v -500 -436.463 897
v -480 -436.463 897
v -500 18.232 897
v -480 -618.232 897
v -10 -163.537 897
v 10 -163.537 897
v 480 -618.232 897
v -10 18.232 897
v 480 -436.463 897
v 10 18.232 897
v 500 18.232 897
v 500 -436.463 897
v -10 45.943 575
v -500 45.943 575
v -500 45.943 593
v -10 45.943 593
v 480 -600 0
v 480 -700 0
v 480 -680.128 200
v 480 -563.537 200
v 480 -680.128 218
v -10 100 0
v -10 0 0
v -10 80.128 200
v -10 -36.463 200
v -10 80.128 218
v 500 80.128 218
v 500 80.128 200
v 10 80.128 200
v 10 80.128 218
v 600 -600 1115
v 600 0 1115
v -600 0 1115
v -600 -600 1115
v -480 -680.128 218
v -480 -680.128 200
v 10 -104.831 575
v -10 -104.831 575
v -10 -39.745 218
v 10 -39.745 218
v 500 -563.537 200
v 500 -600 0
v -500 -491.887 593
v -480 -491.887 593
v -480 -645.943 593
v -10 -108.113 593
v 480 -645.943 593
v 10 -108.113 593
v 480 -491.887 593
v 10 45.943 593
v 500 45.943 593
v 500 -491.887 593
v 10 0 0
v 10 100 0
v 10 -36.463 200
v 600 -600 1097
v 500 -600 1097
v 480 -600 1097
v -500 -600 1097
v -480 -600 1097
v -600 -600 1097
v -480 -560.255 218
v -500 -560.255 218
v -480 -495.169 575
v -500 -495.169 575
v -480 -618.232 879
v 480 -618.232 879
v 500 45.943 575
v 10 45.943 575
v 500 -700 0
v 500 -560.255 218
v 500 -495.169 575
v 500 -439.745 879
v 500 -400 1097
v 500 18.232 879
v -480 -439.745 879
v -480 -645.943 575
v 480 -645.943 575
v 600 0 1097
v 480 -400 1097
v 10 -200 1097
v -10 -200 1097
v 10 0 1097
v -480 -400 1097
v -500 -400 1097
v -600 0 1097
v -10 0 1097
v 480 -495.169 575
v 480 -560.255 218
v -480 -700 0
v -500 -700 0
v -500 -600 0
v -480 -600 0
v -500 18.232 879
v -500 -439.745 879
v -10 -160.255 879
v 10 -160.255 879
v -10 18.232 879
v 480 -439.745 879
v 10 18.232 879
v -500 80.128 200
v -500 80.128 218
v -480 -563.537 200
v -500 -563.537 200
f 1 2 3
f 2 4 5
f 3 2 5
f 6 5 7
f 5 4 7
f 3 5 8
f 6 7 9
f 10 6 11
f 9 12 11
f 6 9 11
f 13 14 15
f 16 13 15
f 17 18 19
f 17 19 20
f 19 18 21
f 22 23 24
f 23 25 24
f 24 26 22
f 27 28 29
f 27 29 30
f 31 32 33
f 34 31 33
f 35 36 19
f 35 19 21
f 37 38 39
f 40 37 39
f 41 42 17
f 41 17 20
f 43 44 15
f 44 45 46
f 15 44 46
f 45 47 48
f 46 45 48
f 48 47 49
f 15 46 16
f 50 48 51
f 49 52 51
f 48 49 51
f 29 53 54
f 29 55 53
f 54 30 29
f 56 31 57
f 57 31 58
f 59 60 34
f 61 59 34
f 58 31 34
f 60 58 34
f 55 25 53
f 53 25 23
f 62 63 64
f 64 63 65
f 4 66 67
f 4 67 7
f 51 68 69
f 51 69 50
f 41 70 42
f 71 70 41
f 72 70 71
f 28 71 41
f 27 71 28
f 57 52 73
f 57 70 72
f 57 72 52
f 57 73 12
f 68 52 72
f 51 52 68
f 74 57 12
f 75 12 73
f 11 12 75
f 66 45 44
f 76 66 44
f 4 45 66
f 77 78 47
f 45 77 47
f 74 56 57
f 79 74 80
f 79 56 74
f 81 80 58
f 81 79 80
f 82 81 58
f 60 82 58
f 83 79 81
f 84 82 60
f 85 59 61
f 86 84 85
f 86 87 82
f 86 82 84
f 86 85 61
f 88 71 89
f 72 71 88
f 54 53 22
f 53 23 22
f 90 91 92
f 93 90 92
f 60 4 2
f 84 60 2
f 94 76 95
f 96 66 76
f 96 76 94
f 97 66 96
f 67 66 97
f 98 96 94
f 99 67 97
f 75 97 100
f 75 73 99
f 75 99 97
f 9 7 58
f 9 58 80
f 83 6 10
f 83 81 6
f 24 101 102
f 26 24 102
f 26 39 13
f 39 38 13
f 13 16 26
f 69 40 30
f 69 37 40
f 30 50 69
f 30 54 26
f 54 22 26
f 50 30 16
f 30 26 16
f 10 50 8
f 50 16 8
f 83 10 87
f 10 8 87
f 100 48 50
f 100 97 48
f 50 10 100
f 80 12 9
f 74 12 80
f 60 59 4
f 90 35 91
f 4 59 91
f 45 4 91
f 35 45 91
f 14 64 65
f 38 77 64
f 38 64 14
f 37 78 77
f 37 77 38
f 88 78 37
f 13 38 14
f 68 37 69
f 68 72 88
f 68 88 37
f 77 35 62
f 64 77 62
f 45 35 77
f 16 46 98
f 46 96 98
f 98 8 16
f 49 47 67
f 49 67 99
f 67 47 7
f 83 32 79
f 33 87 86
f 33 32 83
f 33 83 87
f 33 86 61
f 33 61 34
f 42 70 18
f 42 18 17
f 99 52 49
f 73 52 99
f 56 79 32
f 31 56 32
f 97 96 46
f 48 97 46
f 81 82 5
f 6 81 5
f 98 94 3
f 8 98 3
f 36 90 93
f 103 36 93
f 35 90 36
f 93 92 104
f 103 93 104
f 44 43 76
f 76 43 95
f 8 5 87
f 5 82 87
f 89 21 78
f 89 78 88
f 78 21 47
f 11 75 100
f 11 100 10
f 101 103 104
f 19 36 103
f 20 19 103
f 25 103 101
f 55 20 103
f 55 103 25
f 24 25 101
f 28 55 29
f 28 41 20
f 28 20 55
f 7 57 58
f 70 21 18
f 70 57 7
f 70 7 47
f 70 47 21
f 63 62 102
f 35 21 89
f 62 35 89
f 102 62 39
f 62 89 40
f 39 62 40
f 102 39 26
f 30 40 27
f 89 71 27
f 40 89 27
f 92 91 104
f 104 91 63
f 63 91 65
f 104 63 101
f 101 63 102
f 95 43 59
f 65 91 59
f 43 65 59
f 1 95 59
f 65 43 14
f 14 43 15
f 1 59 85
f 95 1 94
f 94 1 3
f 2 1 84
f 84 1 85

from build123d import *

# Parameters (mm, degrees)
F0_W     = 600
F0_H     = 18
F1_DEPTH = 600
F4_DEPTH = 20
F6_DEPTH = 10
F7_W     = 691.8869644485
F7_H     = 18
F7_W_2   = 636.4630811304
F7_W_3   = 760.2552415679
F8_DEPTH = 500


with BuildPart() as f1:
    # F0 (on Front) → F1 (new body)
    with BuildSketch(Plane.XZ):
        with Locations((-300, 1106)):
            Rectangle(F0_W, F0_H)
    extrude(amount=F1_DEPTH)

    # F3 (on offset) → F4 (join)
    with BuildSketch(Plane.YZ.offset(-500)):
        Polygon((-600, 0), (-400, 1097), (-600, 1097), (-700, 0), align=None)
    extrude(amount=F4_DEPTH)

    # F5 (on Right) → F6 (join)
    with BuildSketch(Plane.YZ):
        Polygon((100, 0), (0, 1097), (-200, 1097), (0, 0), align=None)
    extrude(amount=-F6_DEPTH)

    # F7 (on offset) → F8 (join)
    with BuildSketch(Plane.YZ.offset(-500)):
        with Locations((-300, 584)):
            Rectangle(F7_W, F7_H)
        with Locations((-300, 888)):
            Rectangle(F7_W_2, F7_H)
        with Locations((-300, 209)):
            Rectangle(F7_W_3, F7_H)
    extrude(amount=F8_DEPTH)

    # F9: F1 across plane


with BuildPart() as f1_1:
    add(f1.part)
    add(f1.part.mirror(Plane.YZ))


solid = f1_1.part
